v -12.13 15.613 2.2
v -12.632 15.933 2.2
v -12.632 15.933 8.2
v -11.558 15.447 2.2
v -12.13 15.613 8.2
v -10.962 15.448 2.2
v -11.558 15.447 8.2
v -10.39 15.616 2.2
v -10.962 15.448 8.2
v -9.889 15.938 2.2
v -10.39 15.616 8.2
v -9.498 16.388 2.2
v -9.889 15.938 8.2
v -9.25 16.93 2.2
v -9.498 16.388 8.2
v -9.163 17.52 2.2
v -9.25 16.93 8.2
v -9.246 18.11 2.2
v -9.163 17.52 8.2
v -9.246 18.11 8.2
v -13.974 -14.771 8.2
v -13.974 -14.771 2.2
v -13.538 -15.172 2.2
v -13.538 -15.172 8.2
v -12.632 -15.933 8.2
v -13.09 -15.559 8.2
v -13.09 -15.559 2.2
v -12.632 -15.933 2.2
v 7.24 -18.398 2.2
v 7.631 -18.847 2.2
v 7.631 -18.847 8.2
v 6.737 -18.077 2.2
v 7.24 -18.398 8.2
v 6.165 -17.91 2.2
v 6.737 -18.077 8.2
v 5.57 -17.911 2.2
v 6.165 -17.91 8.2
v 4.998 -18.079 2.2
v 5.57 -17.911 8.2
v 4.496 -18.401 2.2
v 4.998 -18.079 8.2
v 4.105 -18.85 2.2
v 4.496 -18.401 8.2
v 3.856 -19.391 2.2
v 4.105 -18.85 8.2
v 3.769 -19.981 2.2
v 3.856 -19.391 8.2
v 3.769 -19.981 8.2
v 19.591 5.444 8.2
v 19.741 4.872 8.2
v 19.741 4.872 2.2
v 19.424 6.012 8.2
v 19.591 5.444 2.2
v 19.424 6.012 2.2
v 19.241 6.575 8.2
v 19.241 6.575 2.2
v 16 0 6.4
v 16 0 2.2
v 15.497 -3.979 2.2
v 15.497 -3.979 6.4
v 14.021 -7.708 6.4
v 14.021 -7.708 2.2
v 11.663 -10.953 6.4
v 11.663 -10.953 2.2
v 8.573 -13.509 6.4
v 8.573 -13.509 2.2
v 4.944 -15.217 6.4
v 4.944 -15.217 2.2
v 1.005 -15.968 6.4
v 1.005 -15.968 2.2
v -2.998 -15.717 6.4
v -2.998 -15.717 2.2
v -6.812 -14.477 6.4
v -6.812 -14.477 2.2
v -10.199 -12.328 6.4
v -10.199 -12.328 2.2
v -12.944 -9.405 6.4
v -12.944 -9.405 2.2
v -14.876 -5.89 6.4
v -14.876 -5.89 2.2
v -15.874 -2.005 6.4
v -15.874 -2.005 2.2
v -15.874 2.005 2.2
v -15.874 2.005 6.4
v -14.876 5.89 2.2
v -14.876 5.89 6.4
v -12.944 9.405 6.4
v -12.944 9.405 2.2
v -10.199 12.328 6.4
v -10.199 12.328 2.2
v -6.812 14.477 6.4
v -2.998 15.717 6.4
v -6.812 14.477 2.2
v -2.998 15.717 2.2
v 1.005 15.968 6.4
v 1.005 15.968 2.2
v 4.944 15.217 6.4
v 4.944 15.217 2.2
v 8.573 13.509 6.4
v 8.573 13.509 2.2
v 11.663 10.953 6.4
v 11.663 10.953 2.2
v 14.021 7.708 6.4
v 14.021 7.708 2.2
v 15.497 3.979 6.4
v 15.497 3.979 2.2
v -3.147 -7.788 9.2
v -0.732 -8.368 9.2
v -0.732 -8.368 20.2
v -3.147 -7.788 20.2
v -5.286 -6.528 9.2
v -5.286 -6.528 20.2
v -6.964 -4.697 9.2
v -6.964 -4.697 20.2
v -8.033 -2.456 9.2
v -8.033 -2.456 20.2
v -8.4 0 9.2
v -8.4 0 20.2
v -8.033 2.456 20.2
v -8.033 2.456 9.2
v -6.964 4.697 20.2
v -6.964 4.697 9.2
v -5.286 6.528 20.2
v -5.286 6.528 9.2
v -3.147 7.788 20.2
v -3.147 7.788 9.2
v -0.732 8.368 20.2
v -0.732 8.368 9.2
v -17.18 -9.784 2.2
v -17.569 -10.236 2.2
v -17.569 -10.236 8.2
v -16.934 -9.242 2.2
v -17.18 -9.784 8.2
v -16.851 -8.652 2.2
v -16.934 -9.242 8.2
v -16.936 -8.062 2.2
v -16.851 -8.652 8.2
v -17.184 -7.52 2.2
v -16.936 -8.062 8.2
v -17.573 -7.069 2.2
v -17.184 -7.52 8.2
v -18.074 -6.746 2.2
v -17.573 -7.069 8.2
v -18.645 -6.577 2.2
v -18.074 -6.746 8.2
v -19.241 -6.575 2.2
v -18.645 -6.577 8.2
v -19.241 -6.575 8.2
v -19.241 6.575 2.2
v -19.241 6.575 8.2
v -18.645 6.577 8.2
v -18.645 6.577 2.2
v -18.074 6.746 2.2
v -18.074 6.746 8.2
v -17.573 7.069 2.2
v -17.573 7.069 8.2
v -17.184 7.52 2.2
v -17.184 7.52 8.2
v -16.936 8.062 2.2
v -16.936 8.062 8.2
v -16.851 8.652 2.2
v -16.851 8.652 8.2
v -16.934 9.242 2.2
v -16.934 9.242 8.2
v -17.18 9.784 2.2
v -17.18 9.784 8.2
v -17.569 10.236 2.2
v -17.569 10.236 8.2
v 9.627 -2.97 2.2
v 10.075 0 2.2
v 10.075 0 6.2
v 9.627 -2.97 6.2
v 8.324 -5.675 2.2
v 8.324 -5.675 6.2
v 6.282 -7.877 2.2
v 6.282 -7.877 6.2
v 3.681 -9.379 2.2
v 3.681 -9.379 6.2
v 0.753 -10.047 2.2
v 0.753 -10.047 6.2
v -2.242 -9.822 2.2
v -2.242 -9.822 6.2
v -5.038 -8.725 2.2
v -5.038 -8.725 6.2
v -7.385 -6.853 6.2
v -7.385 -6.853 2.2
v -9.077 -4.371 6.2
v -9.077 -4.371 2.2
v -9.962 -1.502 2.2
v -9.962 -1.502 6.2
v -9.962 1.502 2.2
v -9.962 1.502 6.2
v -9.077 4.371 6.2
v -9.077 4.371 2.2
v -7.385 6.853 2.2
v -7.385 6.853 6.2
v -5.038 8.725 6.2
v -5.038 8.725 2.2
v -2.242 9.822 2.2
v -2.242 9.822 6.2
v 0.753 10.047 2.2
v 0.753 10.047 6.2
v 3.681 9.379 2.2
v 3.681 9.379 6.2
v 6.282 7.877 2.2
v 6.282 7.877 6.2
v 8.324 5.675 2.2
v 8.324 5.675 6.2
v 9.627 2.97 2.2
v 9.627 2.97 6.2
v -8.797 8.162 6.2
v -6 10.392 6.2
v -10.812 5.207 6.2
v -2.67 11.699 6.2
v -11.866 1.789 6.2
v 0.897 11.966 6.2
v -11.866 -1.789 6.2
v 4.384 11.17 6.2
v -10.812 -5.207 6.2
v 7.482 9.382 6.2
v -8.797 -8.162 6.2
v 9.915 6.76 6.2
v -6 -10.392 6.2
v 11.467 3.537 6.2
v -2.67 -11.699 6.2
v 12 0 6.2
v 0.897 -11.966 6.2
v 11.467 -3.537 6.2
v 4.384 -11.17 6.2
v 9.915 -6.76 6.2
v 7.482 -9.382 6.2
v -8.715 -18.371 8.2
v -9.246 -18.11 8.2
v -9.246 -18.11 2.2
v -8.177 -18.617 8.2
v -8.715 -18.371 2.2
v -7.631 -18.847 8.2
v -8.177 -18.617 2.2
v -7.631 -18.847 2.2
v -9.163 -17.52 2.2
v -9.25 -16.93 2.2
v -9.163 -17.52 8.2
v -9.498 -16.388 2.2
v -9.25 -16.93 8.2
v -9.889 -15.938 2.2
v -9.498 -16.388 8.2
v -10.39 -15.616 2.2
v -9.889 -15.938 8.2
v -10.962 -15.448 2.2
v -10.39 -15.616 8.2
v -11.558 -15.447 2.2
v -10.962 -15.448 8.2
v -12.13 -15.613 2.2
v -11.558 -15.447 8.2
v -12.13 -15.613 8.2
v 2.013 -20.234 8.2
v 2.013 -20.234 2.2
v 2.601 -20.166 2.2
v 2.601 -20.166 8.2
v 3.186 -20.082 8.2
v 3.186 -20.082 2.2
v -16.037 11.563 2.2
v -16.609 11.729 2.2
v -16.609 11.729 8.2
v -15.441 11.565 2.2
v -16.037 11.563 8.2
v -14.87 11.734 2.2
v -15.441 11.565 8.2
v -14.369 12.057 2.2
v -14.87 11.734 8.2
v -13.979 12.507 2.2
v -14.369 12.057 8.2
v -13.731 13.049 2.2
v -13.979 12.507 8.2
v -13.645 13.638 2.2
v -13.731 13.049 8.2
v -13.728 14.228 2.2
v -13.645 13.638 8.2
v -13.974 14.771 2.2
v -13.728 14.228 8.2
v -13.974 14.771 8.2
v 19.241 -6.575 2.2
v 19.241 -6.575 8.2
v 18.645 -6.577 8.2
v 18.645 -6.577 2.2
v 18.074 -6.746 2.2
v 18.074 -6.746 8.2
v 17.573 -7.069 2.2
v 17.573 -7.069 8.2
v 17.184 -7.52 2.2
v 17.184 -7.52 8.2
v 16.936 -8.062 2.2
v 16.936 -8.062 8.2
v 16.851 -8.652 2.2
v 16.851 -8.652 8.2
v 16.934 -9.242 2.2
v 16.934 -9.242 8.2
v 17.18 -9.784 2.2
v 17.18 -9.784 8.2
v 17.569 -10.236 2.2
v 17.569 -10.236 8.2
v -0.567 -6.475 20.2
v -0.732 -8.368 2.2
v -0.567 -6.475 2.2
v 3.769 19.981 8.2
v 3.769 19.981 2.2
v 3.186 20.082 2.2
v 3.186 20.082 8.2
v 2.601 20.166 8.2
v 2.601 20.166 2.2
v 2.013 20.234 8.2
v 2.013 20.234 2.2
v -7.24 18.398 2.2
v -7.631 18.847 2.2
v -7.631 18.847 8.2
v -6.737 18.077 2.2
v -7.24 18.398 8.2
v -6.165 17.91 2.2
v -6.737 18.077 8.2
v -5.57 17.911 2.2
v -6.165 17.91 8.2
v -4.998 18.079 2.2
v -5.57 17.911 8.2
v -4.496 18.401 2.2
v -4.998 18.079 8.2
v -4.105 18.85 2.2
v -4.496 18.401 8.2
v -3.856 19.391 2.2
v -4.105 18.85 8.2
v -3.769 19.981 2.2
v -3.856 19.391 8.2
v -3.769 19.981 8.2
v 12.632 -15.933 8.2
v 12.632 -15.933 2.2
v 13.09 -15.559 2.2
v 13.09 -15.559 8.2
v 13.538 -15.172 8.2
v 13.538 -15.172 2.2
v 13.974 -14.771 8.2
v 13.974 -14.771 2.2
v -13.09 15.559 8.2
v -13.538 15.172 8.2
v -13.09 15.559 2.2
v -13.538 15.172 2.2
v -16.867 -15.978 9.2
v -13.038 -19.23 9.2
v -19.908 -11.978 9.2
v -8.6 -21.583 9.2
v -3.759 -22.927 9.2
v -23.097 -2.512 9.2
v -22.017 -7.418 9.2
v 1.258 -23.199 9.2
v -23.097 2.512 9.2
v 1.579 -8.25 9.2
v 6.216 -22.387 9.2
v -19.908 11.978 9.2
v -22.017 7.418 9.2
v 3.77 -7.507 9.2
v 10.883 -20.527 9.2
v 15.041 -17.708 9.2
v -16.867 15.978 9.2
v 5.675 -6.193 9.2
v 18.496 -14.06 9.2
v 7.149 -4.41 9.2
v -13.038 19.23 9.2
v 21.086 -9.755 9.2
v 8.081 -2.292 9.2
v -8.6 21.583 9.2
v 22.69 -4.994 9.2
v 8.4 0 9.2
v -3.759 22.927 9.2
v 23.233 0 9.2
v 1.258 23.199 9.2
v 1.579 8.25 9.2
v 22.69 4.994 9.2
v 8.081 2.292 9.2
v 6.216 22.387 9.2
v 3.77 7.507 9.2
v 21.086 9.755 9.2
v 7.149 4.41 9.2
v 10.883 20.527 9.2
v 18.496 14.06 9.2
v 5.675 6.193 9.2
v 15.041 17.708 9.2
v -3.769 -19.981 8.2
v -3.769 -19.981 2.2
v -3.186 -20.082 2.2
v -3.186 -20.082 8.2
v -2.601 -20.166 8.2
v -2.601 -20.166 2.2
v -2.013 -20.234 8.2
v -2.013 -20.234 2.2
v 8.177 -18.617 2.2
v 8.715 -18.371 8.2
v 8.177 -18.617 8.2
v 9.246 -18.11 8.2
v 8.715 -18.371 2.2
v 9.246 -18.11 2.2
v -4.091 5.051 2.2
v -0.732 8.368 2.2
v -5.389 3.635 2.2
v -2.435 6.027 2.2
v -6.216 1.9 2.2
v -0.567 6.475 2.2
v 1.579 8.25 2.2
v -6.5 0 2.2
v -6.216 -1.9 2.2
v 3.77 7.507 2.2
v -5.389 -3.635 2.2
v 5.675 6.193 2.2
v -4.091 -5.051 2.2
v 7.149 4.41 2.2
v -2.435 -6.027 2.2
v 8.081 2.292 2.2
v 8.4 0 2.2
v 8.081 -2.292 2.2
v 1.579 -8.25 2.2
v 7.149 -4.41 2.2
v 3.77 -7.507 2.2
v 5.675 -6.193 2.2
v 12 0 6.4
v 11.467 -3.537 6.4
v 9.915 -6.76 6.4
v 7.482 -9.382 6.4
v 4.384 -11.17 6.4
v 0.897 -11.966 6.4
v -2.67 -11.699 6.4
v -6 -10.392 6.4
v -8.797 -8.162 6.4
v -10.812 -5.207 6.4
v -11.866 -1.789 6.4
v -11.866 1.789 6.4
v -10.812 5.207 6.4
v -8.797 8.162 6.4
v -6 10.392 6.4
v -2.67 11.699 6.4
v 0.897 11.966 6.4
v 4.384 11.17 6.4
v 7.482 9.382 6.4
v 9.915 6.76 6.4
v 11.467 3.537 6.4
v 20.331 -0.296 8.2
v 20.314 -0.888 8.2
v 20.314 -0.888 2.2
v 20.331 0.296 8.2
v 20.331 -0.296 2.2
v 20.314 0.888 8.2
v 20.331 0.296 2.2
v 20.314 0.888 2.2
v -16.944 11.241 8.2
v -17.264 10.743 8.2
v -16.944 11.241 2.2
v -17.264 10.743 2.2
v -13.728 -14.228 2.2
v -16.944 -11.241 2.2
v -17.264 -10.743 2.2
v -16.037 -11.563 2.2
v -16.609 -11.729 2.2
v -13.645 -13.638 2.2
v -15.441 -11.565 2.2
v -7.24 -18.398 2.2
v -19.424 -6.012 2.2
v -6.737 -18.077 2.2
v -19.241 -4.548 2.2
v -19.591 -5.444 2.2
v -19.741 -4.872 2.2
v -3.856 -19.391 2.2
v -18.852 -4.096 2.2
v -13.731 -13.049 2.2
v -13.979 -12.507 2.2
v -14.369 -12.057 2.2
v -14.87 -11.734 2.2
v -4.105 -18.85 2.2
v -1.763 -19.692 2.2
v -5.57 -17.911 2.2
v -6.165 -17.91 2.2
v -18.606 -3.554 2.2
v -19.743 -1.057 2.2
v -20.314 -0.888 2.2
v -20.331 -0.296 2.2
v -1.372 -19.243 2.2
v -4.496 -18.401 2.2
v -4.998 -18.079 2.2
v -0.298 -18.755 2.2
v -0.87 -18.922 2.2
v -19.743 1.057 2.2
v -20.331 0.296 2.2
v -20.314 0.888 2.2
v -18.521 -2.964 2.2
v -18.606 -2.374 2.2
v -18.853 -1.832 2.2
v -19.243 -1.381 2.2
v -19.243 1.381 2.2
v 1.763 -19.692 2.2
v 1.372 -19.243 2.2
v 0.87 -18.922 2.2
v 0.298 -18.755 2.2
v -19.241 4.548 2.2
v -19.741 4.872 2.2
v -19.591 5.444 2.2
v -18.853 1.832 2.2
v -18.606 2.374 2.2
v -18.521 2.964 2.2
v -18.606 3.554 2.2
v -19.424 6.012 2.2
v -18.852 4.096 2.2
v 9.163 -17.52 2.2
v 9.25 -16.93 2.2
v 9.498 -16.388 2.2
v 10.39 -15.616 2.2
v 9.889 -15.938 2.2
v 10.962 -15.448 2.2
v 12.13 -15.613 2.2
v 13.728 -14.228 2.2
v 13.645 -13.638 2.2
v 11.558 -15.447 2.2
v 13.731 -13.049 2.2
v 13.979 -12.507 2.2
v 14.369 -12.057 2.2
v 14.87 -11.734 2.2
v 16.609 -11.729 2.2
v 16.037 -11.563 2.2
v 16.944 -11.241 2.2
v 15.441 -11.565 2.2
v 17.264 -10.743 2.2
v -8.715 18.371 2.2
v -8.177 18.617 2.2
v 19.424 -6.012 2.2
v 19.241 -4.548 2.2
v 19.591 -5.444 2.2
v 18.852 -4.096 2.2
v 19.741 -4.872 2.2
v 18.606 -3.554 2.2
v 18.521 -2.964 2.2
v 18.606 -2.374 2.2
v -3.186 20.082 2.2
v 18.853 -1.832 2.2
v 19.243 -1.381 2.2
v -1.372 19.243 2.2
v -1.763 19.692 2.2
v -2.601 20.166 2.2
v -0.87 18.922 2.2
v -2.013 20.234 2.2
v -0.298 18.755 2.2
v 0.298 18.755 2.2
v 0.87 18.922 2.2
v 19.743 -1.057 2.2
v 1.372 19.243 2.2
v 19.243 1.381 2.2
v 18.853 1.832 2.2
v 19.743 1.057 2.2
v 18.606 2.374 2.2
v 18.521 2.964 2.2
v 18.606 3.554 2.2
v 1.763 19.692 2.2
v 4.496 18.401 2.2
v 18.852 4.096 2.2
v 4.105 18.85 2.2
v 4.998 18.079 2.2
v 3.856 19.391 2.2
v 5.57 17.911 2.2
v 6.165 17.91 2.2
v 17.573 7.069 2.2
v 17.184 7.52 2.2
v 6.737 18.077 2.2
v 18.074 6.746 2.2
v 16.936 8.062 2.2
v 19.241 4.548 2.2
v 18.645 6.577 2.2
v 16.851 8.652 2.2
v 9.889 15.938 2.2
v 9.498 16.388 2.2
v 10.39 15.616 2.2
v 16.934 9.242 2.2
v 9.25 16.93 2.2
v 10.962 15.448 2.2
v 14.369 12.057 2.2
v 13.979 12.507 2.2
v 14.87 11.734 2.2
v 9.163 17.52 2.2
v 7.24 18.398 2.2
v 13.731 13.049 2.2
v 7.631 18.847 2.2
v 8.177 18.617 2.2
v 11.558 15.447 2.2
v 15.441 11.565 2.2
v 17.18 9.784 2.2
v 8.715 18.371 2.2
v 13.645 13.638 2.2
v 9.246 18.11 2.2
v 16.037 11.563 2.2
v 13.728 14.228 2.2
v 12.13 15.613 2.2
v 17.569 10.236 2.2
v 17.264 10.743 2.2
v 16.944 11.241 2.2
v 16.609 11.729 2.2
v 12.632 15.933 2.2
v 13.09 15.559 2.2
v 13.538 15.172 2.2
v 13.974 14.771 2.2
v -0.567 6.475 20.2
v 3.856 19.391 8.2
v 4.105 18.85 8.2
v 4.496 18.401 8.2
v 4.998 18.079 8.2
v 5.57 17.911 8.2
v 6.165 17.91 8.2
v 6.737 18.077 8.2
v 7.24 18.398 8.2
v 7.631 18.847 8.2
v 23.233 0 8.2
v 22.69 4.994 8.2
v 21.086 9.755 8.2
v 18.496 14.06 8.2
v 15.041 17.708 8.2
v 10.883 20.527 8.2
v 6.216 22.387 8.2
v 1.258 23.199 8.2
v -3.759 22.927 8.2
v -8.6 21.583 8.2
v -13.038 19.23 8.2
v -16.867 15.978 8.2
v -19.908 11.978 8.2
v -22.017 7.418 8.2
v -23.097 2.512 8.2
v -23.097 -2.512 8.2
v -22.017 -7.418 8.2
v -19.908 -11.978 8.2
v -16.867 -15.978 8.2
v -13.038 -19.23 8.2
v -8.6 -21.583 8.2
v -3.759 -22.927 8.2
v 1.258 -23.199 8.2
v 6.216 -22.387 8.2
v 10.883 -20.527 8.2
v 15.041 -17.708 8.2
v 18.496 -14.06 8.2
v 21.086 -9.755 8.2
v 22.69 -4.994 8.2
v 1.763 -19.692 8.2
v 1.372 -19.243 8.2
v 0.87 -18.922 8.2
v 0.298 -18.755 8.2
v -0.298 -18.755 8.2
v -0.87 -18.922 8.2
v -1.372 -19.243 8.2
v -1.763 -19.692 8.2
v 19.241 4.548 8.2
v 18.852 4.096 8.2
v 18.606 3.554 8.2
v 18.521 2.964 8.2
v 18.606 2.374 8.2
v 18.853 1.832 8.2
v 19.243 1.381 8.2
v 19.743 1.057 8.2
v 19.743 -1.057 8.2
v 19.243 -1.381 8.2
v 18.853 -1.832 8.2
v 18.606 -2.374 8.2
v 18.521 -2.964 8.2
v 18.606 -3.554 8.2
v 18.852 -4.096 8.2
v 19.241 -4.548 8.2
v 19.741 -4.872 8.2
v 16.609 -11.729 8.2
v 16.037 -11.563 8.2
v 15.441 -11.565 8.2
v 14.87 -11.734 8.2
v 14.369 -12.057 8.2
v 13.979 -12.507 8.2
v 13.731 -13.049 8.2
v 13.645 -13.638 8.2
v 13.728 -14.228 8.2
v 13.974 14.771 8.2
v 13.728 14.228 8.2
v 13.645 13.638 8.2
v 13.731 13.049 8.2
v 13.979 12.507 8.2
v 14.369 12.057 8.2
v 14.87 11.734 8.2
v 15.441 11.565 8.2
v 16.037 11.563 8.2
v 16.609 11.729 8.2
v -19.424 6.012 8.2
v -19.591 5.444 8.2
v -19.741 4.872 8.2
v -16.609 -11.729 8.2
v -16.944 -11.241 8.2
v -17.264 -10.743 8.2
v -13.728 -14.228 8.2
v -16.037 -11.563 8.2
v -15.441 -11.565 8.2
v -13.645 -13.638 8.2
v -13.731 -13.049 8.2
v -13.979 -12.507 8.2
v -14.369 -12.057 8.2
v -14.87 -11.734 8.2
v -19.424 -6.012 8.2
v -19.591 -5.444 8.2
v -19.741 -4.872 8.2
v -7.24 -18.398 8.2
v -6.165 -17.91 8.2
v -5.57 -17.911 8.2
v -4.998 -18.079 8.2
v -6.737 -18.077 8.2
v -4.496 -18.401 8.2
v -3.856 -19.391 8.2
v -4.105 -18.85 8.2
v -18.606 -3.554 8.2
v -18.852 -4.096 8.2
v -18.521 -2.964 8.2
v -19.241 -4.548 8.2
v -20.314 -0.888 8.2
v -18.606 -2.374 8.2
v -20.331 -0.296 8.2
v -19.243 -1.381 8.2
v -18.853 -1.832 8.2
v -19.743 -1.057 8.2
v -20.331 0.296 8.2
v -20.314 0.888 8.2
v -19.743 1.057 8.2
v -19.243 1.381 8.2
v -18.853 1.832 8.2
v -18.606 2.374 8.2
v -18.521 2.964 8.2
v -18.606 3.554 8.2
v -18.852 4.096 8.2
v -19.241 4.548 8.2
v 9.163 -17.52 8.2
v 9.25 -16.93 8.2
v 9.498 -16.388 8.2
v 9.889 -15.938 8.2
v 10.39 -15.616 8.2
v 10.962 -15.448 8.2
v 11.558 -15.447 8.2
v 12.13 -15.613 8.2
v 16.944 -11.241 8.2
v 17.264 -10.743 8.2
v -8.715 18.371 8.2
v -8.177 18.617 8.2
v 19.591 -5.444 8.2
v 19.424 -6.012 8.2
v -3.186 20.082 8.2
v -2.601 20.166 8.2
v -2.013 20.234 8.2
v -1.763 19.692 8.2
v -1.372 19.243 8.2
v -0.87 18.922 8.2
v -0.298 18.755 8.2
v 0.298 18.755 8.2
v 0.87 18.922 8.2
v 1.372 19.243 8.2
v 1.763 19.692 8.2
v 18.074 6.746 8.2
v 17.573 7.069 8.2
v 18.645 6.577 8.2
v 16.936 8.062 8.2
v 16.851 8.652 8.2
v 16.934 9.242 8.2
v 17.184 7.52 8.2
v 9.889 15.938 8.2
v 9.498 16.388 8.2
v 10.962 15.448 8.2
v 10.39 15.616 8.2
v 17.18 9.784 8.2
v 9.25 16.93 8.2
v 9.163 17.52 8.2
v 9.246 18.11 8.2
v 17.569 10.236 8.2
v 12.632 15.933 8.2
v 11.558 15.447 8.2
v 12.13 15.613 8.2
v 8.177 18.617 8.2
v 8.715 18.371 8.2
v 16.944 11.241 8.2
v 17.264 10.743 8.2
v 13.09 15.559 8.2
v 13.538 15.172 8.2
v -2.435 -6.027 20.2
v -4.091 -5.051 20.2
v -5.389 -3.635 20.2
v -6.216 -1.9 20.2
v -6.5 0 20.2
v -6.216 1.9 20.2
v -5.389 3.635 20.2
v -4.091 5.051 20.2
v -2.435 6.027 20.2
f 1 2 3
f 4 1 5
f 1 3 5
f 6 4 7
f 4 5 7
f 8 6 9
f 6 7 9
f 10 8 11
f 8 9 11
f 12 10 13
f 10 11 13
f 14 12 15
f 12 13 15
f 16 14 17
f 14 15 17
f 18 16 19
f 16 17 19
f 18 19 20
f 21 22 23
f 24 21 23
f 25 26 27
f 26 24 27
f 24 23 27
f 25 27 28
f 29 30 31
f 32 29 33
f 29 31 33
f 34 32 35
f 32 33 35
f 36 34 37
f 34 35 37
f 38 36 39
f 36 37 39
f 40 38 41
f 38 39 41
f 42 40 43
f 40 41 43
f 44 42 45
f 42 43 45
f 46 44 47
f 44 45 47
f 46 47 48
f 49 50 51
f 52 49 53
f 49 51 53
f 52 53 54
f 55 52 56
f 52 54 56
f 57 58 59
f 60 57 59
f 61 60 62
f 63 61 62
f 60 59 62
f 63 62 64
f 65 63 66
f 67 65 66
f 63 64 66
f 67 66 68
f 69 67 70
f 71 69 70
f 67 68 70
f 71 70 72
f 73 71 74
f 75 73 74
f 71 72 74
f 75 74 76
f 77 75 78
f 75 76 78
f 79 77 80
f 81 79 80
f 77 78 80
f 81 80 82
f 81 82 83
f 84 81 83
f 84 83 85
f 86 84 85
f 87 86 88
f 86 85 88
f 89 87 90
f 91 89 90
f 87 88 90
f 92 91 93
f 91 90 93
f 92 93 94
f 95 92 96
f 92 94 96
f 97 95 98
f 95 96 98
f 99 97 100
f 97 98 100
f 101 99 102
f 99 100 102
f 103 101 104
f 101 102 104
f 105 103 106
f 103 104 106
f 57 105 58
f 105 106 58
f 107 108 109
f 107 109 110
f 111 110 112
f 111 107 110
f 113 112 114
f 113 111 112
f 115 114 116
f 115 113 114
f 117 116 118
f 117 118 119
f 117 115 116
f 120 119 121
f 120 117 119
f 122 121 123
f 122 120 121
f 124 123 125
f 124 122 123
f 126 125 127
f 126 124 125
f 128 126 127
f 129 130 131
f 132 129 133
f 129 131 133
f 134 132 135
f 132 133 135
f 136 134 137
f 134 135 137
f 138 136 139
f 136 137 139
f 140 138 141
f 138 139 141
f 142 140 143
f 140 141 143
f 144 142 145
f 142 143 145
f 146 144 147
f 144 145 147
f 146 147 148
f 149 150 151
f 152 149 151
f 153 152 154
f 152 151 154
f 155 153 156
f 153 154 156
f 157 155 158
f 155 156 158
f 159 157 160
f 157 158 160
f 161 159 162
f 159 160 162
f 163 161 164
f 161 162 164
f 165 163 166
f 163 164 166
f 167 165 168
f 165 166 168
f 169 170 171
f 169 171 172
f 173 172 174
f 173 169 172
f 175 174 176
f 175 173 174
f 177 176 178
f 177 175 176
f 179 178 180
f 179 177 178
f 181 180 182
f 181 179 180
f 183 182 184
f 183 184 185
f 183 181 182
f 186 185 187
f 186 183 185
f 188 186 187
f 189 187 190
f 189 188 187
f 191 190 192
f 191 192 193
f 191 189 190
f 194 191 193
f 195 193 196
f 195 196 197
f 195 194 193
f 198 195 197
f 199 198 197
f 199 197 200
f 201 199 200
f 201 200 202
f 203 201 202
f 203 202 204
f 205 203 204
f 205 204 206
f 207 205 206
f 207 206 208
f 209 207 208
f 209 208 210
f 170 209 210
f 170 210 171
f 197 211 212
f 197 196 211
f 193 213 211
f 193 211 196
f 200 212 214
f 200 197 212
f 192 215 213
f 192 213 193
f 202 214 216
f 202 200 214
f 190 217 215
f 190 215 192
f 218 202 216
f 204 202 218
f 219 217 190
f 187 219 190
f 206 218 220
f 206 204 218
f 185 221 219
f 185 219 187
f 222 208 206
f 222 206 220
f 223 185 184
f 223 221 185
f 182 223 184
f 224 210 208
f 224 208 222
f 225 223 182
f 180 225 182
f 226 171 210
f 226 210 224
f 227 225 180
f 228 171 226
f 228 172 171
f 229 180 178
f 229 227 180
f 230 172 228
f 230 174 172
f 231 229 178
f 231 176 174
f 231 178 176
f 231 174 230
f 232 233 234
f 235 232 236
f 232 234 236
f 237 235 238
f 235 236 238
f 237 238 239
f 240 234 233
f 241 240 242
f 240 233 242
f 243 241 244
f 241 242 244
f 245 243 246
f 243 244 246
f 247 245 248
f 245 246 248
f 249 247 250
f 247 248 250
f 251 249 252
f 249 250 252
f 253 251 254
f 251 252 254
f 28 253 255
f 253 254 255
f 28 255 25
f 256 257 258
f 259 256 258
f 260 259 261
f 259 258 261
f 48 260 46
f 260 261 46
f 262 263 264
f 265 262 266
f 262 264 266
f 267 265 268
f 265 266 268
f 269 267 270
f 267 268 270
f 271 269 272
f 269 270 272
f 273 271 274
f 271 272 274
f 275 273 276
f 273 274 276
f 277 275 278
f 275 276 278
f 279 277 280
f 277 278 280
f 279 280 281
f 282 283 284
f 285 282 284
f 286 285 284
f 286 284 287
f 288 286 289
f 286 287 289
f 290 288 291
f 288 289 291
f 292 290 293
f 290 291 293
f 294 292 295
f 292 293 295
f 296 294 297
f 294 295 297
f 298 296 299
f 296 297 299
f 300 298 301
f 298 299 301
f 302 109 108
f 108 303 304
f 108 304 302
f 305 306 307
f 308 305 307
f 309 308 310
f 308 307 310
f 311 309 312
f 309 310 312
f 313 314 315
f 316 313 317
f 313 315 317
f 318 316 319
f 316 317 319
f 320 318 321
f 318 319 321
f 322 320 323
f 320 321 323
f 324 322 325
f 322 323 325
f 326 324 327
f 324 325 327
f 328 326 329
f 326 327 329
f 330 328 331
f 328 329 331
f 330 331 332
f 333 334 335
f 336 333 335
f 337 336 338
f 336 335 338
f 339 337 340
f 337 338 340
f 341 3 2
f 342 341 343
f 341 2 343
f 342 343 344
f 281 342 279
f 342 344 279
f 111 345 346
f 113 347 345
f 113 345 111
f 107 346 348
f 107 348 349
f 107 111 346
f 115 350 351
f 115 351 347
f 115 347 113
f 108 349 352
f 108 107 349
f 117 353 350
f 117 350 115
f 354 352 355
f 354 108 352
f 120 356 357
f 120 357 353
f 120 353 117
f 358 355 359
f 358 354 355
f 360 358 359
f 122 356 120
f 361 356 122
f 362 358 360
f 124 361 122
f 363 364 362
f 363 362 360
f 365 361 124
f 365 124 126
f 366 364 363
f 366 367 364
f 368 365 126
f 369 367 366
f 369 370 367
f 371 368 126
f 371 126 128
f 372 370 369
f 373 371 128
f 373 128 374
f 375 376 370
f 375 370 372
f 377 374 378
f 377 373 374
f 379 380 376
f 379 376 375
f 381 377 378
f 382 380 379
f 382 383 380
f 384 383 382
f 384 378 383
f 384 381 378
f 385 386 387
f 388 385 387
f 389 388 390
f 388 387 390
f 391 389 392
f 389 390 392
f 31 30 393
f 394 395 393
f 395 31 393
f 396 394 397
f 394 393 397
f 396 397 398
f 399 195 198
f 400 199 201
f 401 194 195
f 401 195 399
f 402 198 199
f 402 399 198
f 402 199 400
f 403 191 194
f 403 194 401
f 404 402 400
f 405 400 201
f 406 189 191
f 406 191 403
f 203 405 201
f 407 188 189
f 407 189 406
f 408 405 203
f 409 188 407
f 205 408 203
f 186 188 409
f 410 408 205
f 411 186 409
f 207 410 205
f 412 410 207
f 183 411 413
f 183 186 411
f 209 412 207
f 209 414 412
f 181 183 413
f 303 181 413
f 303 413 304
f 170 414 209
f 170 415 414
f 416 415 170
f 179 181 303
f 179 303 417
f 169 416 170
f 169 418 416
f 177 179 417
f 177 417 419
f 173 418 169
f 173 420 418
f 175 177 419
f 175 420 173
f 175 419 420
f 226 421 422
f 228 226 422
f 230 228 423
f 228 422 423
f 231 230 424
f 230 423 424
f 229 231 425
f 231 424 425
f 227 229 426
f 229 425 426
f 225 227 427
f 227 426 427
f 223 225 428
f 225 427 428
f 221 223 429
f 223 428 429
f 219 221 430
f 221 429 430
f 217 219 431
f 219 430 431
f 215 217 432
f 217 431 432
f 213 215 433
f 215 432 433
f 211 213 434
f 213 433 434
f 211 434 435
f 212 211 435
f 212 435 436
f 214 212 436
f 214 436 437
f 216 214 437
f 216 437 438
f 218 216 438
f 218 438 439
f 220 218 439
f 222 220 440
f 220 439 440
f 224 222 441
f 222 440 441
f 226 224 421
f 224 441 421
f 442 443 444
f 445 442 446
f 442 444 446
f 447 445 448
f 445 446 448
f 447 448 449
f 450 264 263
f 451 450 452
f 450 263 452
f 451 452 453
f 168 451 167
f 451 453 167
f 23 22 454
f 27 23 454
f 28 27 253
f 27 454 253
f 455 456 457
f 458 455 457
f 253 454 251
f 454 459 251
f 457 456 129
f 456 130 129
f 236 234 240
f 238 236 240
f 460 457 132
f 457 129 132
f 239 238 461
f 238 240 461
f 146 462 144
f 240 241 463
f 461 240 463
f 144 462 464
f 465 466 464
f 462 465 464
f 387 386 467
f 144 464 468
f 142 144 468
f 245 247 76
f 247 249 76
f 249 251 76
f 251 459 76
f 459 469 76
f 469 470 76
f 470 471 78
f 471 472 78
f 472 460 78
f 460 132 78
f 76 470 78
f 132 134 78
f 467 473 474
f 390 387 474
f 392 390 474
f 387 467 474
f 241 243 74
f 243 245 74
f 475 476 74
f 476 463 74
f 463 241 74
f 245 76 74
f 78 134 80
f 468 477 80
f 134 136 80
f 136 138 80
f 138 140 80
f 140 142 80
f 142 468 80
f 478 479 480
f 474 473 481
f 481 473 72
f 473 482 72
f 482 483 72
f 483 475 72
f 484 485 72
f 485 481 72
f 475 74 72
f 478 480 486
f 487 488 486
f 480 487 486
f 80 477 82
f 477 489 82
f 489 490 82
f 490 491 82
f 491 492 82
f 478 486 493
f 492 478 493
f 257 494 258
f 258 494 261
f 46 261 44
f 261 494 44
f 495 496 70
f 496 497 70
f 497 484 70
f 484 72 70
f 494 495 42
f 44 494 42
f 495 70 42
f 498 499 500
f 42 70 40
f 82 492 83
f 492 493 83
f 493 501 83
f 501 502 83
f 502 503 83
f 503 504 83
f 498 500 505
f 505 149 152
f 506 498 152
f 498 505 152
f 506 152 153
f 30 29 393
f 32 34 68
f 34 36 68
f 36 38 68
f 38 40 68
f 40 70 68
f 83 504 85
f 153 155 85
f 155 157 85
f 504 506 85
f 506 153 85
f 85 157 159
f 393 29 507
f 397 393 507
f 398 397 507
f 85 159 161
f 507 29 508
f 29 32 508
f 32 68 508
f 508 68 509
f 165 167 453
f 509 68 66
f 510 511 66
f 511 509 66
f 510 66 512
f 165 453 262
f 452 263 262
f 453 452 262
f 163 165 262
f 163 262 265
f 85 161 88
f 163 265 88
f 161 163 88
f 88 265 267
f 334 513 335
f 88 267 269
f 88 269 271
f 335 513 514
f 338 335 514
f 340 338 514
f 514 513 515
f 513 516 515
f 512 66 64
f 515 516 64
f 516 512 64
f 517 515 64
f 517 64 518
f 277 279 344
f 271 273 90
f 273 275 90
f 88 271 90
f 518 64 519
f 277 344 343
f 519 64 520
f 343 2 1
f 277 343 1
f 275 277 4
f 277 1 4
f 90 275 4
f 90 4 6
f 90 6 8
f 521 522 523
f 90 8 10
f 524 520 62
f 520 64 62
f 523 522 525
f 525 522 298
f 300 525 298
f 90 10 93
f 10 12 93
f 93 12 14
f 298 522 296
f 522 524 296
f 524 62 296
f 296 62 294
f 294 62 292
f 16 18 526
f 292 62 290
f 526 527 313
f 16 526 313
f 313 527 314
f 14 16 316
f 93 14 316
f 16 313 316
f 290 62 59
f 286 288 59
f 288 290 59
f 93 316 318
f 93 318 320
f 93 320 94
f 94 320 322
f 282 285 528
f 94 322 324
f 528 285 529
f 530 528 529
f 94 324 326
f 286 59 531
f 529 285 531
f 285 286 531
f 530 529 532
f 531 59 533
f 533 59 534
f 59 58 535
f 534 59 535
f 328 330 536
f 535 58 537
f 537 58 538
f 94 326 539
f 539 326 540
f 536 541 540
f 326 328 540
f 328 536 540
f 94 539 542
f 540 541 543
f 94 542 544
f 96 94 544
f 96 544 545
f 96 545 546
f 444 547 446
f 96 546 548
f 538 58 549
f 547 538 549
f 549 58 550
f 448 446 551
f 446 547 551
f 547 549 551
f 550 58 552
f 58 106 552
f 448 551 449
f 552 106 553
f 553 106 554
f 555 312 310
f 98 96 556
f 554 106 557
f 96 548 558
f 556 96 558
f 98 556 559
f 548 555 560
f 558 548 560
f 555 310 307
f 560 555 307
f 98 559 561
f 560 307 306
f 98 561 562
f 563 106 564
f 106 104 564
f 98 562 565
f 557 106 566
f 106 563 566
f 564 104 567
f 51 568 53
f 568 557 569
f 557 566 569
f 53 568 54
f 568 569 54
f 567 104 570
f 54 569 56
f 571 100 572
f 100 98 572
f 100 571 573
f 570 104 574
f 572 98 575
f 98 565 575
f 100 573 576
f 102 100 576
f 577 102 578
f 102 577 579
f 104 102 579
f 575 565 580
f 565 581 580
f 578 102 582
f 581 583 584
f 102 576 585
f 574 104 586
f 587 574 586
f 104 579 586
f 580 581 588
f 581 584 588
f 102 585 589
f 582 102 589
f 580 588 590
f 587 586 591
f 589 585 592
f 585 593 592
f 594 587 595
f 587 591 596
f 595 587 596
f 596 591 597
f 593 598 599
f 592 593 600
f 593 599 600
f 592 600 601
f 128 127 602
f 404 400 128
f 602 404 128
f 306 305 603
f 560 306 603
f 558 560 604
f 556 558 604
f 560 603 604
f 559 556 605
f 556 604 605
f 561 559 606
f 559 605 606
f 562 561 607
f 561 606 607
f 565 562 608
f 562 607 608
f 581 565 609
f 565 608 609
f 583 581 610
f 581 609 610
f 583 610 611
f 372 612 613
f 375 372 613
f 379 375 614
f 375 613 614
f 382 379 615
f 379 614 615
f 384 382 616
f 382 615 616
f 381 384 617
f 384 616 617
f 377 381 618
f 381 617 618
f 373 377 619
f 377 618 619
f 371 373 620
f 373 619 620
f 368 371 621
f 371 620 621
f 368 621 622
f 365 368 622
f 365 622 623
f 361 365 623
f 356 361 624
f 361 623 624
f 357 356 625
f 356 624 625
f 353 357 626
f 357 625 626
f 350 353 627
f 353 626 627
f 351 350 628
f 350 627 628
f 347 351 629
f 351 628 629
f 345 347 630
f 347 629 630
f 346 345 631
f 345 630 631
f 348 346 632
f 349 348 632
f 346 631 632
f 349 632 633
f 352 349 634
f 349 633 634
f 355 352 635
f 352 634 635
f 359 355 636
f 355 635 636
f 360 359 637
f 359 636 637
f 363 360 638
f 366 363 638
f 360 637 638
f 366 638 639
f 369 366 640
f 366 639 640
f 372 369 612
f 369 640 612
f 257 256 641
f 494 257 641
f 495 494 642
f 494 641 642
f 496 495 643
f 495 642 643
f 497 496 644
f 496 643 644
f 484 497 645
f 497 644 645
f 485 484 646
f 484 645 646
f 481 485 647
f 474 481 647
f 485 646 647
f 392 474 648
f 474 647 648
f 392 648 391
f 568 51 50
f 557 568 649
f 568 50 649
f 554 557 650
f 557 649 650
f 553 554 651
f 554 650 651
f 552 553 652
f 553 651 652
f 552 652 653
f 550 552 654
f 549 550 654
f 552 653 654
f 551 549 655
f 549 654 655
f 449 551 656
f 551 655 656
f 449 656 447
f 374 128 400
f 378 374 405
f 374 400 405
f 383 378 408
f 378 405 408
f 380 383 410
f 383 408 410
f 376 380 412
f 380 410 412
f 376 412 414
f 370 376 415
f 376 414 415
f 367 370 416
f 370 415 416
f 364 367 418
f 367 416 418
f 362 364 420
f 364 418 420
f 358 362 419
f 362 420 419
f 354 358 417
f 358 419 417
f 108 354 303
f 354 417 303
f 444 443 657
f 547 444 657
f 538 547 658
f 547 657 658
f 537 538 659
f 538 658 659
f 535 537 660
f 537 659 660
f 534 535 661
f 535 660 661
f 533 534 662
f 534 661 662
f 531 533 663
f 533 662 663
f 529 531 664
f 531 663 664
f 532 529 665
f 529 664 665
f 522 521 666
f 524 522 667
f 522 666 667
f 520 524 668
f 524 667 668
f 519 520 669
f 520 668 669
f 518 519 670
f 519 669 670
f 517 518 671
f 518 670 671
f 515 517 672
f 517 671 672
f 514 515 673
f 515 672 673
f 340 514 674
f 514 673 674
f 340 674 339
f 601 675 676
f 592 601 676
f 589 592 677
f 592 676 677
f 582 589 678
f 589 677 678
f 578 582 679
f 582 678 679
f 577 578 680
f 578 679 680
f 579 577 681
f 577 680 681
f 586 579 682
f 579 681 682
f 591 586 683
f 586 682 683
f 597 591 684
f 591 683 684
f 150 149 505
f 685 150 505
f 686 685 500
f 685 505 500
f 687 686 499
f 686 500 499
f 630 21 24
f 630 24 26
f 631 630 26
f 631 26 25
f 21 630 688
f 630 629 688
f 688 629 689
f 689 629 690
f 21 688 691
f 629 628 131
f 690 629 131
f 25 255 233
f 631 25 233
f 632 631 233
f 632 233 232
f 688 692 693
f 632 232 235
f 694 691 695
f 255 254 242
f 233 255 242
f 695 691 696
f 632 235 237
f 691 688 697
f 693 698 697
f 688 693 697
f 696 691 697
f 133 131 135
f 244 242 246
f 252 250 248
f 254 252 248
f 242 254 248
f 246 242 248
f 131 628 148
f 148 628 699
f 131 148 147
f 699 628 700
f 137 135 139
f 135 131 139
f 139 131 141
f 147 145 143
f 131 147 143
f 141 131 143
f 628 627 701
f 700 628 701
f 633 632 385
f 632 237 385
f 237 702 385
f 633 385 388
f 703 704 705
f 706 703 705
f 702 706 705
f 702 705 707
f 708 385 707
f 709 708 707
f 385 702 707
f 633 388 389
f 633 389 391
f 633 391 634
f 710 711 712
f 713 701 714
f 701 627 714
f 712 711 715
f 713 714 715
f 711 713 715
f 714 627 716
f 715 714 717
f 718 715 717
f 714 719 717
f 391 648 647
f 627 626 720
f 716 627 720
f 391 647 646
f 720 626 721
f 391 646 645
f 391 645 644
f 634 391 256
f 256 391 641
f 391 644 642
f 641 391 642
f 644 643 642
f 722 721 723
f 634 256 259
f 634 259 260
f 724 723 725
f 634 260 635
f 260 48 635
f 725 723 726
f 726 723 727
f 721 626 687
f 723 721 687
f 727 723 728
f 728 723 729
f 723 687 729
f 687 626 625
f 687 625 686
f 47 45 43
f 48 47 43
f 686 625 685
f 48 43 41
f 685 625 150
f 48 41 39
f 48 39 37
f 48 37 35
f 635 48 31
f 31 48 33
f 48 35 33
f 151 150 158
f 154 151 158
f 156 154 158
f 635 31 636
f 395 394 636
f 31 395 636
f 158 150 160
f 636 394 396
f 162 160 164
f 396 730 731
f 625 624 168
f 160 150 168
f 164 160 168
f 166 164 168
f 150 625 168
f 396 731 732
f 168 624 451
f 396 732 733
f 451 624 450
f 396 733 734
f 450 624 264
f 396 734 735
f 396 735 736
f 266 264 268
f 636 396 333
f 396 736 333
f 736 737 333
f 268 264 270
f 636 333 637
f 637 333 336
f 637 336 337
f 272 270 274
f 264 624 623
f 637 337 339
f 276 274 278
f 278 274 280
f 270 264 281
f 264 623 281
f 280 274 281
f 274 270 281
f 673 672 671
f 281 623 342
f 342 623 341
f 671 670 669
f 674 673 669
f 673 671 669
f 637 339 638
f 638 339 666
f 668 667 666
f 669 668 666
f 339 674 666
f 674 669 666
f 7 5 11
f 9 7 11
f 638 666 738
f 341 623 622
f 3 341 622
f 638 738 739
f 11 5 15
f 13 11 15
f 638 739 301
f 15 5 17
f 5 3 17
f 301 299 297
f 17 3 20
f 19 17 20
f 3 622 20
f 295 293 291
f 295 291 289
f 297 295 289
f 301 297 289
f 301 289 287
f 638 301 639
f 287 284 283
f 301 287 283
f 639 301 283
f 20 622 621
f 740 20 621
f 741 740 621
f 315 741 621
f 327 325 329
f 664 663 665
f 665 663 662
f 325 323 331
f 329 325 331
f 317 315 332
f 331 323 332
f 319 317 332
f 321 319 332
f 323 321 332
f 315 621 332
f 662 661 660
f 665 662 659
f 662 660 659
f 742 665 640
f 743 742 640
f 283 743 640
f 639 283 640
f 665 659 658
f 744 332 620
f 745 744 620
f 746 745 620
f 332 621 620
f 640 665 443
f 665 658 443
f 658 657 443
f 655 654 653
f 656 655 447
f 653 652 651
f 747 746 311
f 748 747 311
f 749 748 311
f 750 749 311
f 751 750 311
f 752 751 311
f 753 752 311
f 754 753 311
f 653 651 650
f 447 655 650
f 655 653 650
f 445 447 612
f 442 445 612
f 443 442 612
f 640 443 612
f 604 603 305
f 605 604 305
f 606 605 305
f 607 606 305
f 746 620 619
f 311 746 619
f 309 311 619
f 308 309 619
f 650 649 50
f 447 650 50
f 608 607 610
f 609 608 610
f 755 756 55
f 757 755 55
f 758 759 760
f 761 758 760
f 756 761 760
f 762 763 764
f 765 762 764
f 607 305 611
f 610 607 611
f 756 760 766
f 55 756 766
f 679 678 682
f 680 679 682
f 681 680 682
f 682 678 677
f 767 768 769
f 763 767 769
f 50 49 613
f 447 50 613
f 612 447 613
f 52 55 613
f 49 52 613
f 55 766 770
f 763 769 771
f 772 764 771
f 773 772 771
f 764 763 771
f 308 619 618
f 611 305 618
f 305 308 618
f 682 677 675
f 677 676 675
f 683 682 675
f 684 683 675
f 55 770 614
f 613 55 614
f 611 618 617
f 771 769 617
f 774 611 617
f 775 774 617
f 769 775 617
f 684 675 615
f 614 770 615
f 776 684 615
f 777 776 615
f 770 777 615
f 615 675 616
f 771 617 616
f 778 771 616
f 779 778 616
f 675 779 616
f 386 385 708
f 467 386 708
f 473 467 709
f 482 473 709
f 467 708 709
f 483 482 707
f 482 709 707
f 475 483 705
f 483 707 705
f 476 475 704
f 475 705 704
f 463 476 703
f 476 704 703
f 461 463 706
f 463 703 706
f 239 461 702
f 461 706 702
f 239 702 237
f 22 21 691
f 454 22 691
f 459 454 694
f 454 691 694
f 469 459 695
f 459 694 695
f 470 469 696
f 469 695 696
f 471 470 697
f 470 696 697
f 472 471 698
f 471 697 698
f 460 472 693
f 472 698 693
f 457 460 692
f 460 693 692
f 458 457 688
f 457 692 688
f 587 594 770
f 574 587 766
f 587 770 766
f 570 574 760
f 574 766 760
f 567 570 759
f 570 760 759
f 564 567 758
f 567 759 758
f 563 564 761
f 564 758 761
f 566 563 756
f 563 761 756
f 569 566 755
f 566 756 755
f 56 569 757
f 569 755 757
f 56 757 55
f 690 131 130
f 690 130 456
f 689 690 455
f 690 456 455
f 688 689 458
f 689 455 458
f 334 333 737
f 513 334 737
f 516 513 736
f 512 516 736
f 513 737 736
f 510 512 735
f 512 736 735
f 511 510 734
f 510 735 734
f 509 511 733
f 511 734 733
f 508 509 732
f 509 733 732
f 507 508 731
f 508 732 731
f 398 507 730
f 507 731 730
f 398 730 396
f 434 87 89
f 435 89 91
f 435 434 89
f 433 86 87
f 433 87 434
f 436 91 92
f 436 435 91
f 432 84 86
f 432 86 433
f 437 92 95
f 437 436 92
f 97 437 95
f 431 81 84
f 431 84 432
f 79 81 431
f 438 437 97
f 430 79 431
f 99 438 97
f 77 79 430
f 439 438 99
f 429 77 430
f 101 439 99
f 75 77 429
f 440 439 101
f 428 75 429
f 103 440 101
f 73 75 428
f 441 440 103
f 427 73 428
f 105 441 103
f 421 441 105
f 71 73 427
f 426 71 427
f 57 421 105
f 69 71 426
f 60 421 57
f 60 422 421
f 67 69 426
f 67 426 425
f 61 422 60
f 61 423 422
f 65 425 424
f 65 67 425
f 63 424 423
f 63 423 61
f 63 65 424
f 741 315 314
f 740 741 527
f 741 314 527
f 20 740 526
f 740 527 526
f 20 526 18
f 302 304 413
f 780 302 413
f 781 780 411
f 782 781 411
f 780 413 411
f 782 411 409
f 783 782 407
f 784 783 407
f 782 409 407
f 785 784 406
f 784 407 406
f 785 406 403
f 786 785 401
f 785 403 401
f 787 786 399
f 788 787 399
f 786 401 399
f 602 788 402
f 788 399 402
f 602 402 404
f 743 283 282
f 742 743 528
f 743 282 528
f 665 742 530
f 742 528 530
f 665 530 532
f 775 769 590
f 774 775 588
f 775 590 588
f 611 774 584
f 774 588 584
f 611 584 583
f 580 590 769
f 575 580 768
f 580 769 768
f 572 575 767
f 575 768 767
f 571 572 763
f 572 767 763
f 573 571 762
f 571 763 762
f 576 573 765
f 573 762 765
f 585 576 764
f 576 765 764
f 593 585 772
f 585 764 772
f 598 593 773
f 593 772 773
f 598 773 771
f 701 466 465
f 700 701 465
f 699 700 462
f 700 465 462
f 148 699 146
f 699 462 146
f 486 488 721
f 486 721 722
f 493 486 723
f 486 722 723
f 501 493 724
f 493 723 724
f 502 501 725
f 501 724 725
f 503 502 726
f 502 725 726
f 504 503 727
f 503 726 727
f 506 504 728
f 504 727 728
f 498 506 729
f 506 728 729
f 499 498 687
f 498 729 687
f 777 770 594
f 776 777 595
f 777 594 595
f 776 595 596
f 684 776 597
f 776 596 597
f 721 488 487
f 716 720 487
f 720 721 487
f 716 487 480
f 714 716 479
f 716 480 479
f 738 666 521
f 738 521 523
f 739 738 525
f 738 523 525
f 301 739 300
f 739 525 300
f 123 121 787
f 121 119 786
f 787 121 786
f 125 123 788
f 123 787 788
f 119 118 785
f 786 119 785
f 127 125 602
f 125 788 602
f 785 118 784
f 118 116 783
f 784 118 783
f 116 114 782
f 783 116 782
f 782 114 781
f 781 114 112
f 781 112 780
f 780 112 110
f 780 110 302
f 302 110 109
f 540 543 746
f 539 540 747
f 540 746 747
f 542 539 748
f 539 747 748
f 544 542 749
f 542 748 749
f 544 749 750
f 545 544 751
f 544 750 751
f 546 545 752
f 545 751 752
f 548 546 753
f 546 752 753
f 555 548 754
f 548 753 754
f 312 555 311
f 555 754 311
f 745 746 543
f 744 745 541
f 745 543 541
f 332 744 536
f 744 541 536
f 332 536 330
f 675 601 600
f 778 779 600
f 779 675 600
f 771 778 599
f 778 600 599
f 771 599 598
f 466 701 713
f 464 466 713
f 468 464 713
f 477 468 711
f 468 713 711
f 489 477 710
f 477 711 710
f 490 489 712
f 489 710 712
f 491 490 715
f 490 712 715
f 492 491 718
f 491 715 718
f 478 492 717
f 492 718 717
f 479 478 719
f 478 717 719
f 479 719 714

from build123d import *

# Parameters (mm, degrees)
SKETCH006_R        = 20.3333820507
PAD006_DEPTH       = 6
SKETCH007_R        = 2.1
POCKET_DEPTH       = 121.6482464863
POLARPATTERN_COUNT = 22
SKETCH013_R        = 23.2333820507
PAD007_DEPTH       = 1
SKETCH008_R        = 16
SKETCH008_R_2      = 10.075
POCKET001_DEPTH    = 4.2
SKETCH014_R        = 12
PAD008_DEPTH       = 0.2
SKETCH015_R        = 8.4
POCKET002_DEPTH    = 7.001
PAD009_DEPTH       = 18


with BuildPart() as part:
    # Sketch006 → Pad006 (new body)
    with BuildSketch(Plane.XY):
        Circle(SKETCH006_R)
    extrude(amount=PAD006_DEPTH)

    # Sketch007 (on Face3 of Pad006) → Pocket (cut, through all)
    with BuildSketch(Plane.XY.offset(6)):
        with Locations((0, 20.8333820507)):
            Circle(SKETCH007_R)
    pocket = extrude(amount=-POCKET_DEPTH, mode=Mode.SUBTRACT)

    # PolarPattern: Pocket ×22 about axis
    polarpattern_axis = Axis((0, 0, 6), (0, 0, 1))
    for i in range(1, POLARPATTERN_COUNT):
        add(pocket.rotate(polarpattern_axis, i * 360 / POLARPATTERN_COUNT), mode=Mode.SUBTRACT)

    # Sketch013 (on Face4 of PolarPattern) → Pad007 (join)
    with BuildSketch(Plane.XY.offset(6)):
        Circle(SKETCH013_R)
    extrude(amount=PAD007_DEPTH)

    # Sketch008 (on Face2 of PolarPattern) → Pocket001 (cut)
    with BuildSketch(Plane(origin=(0, 0, 0), x_dir=(1, 0, 0), z_dir=(0, 0, -1))):
        Circle(SKETCH008_R)
        Circle(SKETCH008_R_2, mode=Mode.SUBTRACT)
    extrude(amount=-POCKET001_DEPTH, mode=Mode.SUBTRACT)

    # Sketch014 (on Face51 of Pocket001) → Pad008 (join)
    with BuildSketch(Plane(origin=(0, 0, 4.2), x_dir=(1, 0, 0), z_dir=(0, 0, -1))):
        Circle(SKETCH014_R)
    extrude(amount=PAD008_DEPTH)

    # Sketch015 (on Face55 of Pad008) → Pocket002 (cut, through all)
    with BuildSketch(Plane(origin=(0, 0, 0), x_dir=(1, 0, 0), z_dir=(0, 0, -1))):
        Circle(SKETCH015_R)
    extrude(amount=-POCKET002_DEPTH, mode=Mode.SUBTRACT)

    # Sketch016 (on Face51 of Pocket002) → Pad009 (join)
    with BuildSketch(Plane(origin=(0, 0, 0), x_dir=(1, 0, 0), z_dir=(0, 0, -1))):
        with BuildLine():
            Line((-0.7321082391, -8.368035464), (-0.5665123279, -6.4752655376))
            ThreePointArc((-0.5665123279, 6.4752655376), (-6.5, 0), (-0.5665123279, -6.4752655376))
            Line((-0.7321082391, 8.368035464), (-0.5665123279, 6.4752655376))
            ThreePointArc((-0.7321082391, 8.368035464), (-8.4, 0), (-0.7321082391, -8.368035464))
        make_face()
    extrude(amount=-PAD009_DEPTH)


with BuildPart() as part_1:
    # Body001 placement: moved
    add(part.part.moved(Location((0, 0, 2.2))))


solid = part_1.part
